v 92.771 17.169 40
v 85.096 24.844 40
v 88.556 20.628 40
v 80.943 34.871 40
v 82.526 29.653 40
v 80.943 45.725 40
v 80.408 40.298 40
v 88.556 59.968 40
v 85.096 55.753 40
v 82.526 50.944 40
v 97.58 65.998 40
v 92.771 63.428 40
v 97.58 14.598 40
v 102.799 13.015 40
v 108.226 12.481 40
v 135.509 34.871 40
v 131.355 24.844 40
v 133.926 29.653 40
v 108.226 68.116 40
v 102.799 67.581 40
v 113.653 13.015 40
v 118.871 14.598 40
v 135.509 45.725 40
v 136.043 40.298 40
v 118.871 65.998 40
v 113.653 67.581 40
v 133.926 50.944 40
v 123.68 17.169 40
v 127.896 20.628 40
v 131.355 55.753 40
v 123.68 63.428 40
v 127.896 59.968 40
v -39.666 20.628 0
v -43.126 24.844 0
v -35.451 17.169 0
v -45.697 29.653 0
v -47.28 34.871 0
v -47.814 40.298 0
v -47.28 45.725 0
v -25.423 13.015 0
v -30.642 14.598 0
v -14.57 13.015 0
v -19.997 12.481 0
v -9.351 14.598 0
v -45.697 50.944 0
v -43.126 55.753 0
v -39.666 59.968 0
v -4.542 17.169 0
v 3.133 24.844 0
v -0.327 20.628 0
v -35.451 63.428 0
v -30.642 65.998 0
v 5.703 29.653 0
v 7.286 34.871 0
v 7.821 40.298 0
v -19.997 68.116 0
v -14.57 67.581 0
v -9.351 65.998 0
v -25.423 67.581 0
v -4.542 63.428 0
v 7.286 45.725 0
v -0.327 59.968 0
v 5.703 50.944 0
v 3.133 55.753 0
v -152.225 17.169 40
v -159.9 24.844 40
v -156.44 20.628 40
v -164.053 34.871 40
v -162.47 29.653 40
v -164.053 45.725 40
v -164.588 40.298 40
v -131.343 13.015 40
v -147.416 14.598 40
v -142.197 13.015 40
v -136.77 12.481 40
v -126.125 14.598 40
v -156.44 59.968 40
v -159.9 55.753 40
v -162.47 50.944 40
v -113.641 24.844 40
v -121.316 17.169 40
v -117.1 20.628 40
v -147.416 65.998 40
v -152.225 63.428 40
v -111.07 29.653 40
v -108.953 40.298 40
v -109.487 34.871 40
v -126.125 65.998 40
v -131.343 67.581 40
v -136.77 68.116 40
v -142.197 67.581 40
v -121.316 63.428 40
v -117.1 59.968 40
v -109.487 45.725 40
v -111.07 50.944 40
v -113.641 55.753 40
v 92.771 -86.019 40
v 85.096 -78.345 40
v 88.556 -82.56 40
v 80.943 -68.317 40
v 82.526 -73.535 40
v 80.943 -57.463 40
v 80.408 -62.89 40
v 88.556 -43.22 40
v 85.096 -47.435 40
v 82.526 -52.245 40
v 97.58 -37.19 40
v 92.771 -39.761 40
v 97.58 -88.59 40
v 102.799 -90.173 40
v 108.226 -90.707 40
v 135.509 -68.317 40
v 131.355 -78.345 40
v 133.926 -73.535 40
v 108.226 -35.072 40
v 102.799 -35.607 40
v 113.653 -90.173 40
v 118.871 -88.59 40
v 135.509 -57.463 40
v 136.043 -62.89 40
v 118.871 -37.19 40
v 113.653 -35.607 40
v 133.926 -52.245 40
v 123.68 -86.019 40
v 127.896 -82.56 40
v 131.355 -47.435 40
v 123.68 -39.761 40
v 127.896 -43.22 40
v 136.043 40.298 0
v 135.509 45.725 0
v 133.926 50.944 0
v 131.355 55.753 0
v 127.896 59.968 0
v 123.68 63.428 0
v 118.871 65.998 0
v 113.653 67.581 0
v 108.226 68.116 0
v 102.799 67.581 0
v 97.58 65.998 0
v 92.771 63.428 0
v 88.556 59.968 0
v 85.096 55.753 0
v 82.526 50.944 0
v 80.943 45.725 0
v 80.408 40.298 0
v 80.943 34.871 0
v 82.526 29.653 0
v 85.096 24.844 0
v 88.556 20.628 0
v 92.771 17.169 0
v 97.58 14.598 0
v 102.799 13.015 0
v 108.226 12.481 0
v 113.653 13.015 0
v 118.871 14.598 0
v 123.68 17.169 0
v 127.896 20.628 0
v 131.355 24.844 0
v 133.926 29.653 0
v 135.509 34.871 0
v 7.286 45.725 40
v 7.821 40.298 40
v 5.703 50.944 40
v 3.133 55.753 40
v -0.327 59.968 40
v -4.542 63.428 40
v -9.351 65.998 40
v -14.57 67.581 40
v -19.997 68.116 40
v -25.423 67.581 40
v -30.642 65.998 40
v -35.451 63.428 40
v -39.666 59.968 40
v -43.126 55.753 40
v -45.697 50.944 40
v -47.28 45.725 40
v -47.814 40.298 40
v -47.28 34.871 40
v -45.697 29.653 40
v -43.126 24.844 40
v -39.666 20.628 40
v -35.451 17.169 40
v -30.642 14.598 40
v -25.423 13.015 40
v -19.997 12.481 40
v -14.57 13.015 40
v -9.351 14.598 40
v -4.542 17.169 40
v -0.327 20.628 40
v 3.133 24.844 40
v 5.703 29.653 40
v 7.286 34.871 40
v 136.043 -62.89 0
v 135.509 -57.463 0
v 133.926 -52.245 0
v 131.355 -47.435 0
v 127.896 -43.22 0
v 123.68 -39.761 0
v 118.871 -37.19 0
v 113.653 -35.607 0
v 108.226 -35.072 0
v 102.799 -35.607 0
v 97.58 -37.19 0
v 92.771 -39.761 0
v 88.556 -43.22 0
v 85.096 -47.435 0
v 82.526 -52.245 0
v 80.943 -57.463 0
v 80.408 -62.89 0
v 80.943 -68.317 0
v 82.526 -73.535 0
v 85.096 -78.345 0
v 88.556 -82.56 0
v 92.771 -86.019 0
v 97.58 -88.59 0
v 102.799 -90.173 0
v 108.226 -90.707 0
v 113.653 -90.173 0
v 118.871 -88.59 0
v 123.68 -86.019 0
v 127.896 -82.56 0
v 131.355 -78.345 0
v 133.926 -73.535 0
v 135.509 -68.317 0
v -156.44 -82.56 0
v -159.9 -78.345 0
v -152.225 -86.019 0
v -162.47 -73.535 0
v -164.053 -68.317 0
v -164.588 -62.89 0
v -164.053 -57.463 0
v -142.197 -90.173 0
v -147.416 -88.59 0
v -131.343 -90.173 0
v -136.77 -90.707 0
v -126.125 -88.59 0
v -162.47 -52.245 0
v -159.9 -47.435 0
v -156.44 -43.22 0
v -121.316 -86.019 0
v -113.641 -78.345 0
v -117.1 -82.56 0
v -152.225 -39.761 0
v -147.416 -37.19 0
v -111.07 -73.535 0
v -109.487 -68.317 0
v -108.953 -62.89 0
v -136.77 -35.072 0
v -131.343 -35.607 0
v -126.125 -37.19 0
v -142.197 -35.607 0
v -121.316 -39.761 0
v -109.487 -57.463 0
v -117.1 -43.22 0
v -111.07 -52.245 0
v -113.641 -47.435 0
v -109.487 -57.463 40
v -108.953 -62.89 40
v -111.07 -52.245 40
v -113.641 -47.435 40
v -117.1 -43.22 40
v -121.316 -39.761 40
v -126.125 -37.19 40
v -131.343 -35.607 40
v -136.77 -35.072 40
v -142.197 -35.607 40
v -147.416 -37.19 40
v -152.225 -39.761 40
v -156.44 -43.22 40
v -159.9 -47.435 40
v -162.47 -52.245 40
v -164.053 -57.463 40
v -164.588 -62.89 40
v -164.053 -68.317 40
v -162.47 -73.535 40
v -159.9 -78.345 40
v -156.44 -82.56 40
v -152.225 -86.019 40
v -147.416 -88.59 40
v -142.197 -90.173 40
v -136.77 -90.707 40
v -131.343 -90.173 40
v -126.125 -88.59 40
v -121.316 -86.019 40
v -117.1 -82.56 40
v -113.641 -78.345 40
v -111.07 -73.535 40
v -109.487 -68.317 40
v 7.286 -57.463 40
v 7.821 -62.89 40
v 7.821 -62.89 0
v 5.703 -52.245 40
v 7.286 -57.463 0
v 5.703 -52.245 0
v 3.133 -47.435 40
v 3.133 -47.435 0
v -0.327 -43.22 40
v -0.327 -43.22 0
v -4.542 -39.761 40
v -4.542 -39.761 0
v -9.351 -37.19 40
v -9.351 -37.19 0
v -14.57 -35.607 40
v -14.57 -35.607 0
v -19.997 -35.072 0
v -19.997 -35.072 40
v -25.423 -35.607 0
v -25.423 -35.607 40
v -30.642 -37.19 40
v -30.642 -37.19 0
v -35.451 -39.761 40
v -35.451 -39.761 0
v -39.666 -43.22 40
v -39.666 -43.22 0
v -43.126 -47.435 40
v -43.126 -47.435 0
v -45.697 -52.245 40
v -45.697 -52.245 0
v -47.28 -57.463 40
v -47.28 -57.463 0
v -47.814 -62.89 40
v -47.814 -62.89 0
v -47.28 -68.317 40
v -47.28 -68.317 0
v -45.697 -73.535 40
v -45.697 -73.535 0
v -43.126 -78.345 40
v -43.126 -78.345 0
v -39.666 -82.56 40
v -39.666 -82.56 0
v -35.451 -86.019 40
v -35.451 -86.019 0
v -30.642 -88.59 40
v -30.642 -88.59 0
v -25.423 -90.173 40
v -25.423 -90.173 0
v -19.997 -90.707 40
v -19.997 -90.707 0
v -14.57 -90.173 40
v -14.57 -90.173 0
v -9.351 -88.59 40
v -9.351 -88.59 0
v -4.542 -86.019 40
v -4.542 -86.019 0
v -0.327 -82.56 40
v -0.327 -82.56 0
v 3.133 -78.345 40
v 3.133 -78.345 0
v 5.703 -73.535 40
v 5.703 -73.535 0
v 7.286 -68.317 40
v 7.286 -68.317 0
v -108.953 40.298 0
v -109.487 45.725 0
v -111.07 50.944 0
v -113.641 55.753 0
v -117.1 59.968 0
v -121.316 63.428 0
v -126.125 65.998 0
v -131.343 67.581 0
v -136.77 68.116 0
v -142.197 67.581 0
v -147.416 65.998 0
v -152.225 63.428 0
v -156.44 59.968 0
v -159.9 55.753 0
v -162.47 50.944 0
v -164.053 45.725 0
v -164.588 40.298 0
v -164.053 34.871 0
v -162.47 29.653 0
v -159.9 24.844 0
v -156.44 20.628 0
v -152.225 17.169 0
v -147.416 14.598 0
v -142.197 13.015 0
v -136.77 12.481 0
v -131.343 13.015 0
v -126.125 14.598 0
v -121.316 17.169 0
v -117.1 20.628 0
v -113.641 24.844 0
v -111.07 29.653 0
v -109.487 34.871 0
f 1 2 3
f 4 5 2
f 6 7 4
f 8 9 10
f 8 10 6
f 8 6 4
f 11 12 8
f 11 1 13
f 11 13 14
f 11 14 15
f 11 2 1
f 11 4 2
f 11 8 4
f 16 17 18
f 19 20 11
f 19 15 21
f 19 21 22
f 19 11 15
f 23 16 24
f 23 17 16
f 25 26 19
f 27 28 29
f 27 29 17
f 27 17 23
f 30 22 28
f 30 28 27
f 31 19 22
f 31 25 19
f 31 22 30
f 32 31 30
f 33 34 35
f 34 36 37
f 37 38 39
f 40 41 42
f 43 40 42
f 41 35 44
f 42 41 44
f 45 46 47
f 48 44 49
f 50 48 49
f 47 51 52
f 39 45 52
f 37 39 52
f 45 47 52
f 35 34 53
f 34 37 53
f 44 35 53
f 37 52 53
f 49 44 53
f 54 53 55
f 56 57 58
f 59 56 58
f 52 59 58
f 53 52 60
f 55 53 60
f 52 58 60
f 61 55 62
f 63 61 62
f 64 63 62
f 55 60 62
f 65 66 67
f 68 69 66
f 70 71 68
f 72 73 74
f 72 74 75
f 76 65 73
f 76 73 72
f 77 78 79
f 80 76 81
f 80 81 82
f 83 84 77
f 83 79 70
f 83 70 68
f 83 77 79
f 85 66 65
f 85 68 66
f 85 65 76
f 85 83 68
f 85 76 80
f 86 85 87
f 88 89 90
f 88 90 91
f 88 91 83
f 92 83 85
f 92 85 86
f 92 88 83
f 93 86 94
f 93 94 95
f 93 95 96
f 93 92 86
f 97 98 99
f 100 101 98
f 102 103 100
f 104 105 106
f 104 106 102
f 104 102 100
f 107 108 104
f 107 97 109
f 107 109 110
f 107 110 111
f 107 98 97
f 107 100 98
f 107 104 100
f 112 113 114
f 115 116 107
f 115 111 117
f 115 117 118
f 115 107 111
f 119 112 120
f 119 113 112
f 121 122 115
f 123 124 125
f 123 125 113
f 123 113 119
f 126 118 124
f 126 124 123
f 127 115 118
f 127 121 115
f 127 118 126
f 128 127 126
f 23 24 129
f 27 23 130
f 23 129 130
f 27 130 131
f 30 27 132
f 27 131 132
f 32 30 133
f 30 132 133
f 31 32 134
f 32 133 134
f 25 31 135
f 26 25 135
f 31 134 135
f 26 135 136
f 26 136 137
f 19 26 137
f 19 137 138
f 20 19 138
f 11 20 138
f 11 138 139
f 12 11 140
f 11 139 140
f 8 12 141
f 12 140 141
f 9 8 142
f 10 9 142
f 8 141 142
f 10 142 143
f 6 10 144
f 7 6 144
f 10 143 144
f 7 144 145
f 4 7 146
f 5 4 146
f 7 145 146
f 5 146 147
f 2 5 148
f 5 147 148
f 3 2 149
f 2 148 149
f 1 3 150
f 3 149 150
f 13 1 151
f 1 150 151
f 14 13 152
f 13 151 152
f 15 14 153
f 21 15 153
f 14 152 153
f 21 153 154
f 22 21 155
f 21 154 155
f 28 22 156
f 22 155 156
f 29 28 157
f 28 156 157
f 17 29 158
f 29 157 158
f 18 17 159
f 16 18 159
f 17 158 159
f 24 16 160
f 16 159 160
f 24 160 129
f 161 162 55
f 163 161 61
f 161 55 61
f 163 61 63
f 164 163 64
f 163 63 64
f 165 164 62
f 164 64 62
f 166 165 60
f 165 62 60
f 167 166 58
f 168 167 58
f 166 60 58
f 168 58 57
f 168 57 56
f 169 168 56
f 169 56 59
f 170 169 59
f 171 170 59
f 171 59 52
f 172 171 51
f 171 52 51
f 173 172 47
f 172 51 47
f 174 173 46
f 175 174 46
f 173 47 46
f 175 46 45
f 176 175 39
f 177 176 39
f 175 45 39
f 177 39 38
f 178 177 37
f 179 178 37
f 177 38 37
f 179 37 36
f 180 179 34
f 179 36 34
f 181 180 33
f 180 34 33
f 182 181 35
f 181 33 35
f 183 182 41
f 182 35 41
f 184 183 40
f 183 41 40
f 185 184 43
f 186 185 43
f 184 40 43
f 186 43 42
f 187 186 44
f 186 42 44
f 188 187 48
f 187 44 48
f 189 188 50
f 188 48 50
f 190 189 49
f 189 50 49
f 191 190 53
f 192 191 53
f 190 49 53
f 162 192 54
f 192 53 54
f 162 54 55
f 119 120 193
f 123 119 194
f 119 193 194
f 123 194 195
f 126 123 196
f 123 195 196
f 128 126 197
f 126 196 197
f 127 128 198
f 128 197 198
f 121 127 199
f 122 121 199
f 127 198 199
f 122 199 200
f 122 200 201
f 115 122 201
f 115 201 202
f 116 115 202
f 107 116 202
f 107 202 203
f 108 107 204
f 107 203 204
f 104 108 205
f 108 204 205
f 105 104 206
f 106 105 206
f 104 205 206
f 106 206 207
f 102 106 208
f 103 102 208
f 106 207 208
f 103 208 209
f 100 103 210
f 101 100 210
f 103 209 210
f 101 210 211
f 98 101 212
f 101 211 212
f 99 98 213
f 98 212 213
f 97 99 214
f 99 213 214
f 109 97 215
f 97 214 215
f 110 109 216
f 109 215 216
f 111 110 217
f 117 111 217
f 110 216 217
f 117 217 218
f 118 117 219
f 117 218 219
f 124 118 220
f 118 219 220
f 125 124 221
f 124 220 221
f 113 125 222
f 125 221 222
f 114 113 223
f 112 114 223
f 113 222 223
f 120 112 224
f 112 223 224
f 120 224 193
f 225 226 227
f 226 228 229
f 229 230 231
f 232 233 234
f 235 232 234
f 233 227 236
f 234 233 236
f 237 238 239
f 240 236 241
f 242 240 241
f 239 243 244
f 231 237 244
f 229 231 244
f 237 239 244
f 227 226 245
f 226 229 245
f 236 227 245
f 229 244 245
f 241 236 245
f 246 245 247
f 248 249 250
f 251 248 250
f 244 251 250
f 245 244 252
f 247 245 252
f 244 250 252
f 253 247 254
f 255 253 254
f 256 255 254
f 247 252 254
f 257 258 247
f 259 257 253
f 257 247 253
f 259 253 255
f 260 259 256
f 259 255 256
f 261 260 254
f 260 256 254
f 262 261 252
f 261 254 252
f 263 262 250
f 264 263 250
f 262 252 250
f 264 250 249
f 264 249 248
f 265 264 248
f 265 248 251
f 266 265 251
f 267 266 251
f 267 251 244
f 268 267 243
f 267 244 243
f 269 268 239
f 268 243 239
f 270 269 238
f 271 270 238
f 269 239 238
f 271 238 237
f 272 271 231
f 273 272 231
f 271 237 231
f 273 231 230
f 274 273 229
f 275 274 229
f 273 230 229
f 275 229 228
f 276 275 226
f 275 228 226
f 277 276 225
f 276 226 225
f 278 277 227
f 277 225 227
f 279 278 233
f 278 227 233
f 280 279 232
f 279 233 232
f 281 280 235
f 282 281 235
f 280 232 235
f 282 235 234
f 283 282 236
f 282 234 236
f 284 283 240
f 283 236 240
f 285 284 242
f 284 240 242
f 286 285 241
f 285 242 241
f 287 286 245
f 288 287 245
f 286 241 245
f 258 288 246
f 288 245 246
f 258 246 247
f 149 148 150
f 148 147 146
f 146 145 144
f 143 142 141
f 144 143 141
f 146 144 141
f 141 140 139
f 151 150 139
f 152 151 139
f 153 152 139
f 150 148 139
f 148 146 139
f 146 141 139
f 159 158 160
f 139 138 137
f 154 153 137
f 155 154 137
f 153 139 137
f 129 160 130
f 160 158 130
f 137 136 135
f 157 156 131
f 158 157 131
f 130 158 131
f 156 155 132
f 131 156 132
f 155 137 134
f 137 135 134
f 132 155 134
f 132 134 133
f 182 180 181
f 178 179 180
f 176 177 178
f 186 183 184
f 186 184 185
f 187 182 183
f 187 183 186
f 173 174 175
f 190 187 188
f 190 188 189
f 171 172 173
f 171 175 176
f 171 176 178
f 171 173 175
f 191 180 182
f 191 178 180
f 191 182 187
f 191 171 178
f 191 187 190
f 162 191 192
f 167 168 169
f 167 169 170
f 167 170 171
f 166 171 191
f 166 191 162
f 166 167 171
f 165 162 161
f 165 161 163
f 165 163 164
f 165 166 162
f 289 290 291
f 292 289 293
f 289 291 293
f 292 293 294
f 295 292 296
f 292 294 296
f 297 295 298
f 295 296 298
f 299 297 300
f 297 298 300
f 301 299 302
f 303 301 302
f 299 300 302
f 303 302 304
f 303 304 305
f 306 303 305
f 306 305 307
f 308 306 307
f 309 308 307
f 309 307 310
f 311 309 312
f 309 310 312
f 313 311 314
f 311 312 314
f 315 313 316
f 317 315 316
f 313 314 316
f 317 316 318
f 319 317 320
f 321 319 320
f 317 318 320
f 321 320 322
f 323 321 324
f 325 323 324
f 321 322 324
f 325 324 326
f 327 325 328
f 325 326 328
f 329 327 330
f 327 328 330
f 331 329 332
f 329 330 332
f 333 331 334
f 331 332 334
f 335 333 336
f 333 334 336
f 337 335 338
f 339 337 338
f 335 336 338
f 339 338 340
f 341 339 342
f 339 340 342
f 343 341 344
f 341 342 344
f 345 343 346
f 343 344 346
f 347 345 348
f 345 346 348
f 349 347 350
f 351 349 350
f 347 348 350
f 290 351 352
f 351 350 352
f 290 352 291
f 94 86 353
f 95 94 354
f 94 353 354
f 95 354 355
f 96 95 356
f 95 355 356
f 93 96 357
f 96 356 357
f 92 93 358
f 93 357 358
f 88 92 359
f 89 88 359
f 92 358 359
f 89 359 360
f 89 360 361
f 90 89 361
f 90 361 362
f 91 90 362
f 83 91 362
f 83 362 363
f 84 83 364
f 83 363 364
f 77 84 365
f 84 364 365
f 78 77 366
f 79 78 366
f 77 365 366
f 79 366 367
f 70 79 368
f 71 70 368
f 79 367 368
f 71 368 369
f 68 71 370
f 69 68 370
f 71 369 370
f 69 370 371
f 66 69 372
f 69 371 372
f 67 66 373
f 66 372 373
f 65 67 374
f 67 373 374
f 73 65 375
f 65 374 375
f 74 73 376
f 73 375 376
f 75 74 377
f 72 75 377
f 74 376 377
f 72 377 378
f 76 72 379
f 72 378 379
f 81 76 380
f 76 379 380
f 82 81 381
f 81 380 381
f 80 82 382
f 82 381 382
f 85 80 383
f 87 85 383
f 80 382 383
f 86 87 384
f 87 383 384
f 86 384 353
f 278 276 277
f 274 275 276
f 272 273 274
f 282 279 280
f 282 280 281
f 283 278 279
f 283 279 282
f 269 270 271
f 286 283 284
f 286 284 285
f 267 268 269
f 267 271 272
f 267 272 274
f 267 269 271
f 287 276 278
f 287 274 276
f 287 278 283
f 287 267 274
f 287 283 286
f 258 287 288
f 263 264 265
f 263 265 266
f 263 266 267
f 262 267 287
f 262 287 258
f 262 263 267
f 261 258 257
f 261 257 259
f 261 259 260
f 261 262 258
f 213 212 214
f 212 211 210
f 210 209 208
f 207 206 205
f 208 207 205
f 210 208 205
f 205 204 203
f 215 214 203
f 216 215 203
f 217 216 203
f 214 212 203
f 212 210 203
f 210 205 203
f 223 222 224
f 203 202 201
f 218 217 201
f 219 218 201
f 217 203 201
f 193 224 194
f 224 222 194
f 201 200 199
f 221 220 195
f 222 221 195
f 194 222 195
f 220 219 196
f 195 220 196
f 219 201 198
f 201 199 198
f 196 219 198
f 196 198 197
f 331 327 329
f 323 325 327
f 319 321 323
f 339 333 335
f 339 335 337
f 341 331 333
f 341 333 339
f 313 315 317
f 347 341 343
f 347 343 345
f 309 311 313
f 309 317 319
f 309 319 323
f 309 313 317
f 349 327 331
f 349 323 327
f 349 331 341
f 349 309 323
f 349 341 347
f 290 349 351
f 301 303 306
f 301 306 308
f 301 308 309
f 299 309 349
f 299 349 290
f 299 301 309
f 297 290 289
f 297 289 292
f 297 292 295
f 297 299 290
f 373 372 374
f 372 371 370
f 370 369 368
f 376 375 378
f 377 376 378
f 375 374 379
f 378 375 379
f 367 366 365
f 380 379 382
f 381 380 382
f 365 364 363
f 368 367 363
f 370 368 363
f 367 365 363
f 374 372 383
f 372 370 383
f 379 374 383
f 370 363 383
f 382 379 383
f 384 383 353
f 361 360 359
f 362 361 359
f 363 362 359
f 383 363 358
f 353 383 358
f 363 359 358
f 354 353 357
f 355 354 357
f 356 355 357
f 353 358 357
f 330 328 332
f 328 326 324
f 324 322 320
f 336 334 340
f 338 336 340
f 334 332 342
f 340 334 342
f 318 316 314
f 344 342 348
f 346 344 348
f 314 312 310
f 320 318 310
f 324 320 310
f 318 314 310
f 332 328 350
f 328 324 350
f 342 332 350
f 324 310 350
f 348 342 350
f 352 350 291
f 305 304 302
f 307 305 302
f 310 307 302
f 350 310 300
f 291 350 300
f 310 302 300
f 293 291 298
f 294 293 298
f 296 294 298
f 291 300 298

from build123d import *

# Parameters (mm, degrees)
SKETCH1_R             = 27.817474812
BOSS_EXTRUDE1_DEPTH   = 40
BOSS_EXTRUDE1_2_DEPTH = 40
BOSS_EXTRUDE1_3_DEPTH = 40
BOSS_EXTRUDE1_4_DEPTH = 40
BOSS_EXTRUDE1_5_DEPTH = 40
BOSS_EXTRUDE1_6_DEPTH = 40


with BuildPart() as part:
    # Sketch1 → Boss-Extrude1 (new body)
    with BuildSketch(Plane.XY):
        with Locations((-136.770389137, 40.298418228)):
            Circle(SKETCH1_R)
    extrude(amount=BOSS_EXTRUDE1_DEPTH)


with BuildPart() as body_2:
    # Sketch1 → Boss-Extrude1 2 (new body)
    with BuildSketch(Plane.XY):
        with Locations((-19.99656359, 40.298418228)):
            Circle(SKETCH1_R)
    extrude(amount=BOSS_EXTRUDE1_2_DEPTH)


with BuildPart() as body_3:
    # Sketch1 → Boss-Extrude1 3 (new body)
    with BuildSketch(Plane.XY):
        with Locations((108.225676226, 40.298418228)):
            Circle(SKETCH1_R)
    extrude(amount=BOSS_EXTRUDE1_3_DEPTH)


with BuildPart() as body_4:
    # Sketch1 → Boss-Extrude1 4 (new body)
    with BuildSketch(Plane.XY):
        with Locations((-136.770389137, -62.889955719)):
            Circle(SKETCH1_R)
    extrude(amount=BOSS_EXTRUDE1_4_DEPTH)


with BuildPart() as body_5:
    # Sketch1 → Boss-Extrude1 5 (new body)
    with BuildSketch(Plane.XY):
        with Locations((-19.99656359, -62.889955719)):
            Circle(SKETCH1_R)
    extrude(amount=BOSS_EXTRUDE1_5_DEPTH)


with BuildPart() as body_6:
    # Sketch1 → Boss-Extrude1 6 (new body)
    with BuildSketch(Plane.XY):
        with Locations((108.225676226, -62.889955719)):
            Circle(SKETCH1_R)
    extrude(amount=BOSS_EXTRUDE1_6_DEPTH)


solid = Compound([part.part, body_2.part, body_3.part, body_4.part, body_5.part, body_6.part])
